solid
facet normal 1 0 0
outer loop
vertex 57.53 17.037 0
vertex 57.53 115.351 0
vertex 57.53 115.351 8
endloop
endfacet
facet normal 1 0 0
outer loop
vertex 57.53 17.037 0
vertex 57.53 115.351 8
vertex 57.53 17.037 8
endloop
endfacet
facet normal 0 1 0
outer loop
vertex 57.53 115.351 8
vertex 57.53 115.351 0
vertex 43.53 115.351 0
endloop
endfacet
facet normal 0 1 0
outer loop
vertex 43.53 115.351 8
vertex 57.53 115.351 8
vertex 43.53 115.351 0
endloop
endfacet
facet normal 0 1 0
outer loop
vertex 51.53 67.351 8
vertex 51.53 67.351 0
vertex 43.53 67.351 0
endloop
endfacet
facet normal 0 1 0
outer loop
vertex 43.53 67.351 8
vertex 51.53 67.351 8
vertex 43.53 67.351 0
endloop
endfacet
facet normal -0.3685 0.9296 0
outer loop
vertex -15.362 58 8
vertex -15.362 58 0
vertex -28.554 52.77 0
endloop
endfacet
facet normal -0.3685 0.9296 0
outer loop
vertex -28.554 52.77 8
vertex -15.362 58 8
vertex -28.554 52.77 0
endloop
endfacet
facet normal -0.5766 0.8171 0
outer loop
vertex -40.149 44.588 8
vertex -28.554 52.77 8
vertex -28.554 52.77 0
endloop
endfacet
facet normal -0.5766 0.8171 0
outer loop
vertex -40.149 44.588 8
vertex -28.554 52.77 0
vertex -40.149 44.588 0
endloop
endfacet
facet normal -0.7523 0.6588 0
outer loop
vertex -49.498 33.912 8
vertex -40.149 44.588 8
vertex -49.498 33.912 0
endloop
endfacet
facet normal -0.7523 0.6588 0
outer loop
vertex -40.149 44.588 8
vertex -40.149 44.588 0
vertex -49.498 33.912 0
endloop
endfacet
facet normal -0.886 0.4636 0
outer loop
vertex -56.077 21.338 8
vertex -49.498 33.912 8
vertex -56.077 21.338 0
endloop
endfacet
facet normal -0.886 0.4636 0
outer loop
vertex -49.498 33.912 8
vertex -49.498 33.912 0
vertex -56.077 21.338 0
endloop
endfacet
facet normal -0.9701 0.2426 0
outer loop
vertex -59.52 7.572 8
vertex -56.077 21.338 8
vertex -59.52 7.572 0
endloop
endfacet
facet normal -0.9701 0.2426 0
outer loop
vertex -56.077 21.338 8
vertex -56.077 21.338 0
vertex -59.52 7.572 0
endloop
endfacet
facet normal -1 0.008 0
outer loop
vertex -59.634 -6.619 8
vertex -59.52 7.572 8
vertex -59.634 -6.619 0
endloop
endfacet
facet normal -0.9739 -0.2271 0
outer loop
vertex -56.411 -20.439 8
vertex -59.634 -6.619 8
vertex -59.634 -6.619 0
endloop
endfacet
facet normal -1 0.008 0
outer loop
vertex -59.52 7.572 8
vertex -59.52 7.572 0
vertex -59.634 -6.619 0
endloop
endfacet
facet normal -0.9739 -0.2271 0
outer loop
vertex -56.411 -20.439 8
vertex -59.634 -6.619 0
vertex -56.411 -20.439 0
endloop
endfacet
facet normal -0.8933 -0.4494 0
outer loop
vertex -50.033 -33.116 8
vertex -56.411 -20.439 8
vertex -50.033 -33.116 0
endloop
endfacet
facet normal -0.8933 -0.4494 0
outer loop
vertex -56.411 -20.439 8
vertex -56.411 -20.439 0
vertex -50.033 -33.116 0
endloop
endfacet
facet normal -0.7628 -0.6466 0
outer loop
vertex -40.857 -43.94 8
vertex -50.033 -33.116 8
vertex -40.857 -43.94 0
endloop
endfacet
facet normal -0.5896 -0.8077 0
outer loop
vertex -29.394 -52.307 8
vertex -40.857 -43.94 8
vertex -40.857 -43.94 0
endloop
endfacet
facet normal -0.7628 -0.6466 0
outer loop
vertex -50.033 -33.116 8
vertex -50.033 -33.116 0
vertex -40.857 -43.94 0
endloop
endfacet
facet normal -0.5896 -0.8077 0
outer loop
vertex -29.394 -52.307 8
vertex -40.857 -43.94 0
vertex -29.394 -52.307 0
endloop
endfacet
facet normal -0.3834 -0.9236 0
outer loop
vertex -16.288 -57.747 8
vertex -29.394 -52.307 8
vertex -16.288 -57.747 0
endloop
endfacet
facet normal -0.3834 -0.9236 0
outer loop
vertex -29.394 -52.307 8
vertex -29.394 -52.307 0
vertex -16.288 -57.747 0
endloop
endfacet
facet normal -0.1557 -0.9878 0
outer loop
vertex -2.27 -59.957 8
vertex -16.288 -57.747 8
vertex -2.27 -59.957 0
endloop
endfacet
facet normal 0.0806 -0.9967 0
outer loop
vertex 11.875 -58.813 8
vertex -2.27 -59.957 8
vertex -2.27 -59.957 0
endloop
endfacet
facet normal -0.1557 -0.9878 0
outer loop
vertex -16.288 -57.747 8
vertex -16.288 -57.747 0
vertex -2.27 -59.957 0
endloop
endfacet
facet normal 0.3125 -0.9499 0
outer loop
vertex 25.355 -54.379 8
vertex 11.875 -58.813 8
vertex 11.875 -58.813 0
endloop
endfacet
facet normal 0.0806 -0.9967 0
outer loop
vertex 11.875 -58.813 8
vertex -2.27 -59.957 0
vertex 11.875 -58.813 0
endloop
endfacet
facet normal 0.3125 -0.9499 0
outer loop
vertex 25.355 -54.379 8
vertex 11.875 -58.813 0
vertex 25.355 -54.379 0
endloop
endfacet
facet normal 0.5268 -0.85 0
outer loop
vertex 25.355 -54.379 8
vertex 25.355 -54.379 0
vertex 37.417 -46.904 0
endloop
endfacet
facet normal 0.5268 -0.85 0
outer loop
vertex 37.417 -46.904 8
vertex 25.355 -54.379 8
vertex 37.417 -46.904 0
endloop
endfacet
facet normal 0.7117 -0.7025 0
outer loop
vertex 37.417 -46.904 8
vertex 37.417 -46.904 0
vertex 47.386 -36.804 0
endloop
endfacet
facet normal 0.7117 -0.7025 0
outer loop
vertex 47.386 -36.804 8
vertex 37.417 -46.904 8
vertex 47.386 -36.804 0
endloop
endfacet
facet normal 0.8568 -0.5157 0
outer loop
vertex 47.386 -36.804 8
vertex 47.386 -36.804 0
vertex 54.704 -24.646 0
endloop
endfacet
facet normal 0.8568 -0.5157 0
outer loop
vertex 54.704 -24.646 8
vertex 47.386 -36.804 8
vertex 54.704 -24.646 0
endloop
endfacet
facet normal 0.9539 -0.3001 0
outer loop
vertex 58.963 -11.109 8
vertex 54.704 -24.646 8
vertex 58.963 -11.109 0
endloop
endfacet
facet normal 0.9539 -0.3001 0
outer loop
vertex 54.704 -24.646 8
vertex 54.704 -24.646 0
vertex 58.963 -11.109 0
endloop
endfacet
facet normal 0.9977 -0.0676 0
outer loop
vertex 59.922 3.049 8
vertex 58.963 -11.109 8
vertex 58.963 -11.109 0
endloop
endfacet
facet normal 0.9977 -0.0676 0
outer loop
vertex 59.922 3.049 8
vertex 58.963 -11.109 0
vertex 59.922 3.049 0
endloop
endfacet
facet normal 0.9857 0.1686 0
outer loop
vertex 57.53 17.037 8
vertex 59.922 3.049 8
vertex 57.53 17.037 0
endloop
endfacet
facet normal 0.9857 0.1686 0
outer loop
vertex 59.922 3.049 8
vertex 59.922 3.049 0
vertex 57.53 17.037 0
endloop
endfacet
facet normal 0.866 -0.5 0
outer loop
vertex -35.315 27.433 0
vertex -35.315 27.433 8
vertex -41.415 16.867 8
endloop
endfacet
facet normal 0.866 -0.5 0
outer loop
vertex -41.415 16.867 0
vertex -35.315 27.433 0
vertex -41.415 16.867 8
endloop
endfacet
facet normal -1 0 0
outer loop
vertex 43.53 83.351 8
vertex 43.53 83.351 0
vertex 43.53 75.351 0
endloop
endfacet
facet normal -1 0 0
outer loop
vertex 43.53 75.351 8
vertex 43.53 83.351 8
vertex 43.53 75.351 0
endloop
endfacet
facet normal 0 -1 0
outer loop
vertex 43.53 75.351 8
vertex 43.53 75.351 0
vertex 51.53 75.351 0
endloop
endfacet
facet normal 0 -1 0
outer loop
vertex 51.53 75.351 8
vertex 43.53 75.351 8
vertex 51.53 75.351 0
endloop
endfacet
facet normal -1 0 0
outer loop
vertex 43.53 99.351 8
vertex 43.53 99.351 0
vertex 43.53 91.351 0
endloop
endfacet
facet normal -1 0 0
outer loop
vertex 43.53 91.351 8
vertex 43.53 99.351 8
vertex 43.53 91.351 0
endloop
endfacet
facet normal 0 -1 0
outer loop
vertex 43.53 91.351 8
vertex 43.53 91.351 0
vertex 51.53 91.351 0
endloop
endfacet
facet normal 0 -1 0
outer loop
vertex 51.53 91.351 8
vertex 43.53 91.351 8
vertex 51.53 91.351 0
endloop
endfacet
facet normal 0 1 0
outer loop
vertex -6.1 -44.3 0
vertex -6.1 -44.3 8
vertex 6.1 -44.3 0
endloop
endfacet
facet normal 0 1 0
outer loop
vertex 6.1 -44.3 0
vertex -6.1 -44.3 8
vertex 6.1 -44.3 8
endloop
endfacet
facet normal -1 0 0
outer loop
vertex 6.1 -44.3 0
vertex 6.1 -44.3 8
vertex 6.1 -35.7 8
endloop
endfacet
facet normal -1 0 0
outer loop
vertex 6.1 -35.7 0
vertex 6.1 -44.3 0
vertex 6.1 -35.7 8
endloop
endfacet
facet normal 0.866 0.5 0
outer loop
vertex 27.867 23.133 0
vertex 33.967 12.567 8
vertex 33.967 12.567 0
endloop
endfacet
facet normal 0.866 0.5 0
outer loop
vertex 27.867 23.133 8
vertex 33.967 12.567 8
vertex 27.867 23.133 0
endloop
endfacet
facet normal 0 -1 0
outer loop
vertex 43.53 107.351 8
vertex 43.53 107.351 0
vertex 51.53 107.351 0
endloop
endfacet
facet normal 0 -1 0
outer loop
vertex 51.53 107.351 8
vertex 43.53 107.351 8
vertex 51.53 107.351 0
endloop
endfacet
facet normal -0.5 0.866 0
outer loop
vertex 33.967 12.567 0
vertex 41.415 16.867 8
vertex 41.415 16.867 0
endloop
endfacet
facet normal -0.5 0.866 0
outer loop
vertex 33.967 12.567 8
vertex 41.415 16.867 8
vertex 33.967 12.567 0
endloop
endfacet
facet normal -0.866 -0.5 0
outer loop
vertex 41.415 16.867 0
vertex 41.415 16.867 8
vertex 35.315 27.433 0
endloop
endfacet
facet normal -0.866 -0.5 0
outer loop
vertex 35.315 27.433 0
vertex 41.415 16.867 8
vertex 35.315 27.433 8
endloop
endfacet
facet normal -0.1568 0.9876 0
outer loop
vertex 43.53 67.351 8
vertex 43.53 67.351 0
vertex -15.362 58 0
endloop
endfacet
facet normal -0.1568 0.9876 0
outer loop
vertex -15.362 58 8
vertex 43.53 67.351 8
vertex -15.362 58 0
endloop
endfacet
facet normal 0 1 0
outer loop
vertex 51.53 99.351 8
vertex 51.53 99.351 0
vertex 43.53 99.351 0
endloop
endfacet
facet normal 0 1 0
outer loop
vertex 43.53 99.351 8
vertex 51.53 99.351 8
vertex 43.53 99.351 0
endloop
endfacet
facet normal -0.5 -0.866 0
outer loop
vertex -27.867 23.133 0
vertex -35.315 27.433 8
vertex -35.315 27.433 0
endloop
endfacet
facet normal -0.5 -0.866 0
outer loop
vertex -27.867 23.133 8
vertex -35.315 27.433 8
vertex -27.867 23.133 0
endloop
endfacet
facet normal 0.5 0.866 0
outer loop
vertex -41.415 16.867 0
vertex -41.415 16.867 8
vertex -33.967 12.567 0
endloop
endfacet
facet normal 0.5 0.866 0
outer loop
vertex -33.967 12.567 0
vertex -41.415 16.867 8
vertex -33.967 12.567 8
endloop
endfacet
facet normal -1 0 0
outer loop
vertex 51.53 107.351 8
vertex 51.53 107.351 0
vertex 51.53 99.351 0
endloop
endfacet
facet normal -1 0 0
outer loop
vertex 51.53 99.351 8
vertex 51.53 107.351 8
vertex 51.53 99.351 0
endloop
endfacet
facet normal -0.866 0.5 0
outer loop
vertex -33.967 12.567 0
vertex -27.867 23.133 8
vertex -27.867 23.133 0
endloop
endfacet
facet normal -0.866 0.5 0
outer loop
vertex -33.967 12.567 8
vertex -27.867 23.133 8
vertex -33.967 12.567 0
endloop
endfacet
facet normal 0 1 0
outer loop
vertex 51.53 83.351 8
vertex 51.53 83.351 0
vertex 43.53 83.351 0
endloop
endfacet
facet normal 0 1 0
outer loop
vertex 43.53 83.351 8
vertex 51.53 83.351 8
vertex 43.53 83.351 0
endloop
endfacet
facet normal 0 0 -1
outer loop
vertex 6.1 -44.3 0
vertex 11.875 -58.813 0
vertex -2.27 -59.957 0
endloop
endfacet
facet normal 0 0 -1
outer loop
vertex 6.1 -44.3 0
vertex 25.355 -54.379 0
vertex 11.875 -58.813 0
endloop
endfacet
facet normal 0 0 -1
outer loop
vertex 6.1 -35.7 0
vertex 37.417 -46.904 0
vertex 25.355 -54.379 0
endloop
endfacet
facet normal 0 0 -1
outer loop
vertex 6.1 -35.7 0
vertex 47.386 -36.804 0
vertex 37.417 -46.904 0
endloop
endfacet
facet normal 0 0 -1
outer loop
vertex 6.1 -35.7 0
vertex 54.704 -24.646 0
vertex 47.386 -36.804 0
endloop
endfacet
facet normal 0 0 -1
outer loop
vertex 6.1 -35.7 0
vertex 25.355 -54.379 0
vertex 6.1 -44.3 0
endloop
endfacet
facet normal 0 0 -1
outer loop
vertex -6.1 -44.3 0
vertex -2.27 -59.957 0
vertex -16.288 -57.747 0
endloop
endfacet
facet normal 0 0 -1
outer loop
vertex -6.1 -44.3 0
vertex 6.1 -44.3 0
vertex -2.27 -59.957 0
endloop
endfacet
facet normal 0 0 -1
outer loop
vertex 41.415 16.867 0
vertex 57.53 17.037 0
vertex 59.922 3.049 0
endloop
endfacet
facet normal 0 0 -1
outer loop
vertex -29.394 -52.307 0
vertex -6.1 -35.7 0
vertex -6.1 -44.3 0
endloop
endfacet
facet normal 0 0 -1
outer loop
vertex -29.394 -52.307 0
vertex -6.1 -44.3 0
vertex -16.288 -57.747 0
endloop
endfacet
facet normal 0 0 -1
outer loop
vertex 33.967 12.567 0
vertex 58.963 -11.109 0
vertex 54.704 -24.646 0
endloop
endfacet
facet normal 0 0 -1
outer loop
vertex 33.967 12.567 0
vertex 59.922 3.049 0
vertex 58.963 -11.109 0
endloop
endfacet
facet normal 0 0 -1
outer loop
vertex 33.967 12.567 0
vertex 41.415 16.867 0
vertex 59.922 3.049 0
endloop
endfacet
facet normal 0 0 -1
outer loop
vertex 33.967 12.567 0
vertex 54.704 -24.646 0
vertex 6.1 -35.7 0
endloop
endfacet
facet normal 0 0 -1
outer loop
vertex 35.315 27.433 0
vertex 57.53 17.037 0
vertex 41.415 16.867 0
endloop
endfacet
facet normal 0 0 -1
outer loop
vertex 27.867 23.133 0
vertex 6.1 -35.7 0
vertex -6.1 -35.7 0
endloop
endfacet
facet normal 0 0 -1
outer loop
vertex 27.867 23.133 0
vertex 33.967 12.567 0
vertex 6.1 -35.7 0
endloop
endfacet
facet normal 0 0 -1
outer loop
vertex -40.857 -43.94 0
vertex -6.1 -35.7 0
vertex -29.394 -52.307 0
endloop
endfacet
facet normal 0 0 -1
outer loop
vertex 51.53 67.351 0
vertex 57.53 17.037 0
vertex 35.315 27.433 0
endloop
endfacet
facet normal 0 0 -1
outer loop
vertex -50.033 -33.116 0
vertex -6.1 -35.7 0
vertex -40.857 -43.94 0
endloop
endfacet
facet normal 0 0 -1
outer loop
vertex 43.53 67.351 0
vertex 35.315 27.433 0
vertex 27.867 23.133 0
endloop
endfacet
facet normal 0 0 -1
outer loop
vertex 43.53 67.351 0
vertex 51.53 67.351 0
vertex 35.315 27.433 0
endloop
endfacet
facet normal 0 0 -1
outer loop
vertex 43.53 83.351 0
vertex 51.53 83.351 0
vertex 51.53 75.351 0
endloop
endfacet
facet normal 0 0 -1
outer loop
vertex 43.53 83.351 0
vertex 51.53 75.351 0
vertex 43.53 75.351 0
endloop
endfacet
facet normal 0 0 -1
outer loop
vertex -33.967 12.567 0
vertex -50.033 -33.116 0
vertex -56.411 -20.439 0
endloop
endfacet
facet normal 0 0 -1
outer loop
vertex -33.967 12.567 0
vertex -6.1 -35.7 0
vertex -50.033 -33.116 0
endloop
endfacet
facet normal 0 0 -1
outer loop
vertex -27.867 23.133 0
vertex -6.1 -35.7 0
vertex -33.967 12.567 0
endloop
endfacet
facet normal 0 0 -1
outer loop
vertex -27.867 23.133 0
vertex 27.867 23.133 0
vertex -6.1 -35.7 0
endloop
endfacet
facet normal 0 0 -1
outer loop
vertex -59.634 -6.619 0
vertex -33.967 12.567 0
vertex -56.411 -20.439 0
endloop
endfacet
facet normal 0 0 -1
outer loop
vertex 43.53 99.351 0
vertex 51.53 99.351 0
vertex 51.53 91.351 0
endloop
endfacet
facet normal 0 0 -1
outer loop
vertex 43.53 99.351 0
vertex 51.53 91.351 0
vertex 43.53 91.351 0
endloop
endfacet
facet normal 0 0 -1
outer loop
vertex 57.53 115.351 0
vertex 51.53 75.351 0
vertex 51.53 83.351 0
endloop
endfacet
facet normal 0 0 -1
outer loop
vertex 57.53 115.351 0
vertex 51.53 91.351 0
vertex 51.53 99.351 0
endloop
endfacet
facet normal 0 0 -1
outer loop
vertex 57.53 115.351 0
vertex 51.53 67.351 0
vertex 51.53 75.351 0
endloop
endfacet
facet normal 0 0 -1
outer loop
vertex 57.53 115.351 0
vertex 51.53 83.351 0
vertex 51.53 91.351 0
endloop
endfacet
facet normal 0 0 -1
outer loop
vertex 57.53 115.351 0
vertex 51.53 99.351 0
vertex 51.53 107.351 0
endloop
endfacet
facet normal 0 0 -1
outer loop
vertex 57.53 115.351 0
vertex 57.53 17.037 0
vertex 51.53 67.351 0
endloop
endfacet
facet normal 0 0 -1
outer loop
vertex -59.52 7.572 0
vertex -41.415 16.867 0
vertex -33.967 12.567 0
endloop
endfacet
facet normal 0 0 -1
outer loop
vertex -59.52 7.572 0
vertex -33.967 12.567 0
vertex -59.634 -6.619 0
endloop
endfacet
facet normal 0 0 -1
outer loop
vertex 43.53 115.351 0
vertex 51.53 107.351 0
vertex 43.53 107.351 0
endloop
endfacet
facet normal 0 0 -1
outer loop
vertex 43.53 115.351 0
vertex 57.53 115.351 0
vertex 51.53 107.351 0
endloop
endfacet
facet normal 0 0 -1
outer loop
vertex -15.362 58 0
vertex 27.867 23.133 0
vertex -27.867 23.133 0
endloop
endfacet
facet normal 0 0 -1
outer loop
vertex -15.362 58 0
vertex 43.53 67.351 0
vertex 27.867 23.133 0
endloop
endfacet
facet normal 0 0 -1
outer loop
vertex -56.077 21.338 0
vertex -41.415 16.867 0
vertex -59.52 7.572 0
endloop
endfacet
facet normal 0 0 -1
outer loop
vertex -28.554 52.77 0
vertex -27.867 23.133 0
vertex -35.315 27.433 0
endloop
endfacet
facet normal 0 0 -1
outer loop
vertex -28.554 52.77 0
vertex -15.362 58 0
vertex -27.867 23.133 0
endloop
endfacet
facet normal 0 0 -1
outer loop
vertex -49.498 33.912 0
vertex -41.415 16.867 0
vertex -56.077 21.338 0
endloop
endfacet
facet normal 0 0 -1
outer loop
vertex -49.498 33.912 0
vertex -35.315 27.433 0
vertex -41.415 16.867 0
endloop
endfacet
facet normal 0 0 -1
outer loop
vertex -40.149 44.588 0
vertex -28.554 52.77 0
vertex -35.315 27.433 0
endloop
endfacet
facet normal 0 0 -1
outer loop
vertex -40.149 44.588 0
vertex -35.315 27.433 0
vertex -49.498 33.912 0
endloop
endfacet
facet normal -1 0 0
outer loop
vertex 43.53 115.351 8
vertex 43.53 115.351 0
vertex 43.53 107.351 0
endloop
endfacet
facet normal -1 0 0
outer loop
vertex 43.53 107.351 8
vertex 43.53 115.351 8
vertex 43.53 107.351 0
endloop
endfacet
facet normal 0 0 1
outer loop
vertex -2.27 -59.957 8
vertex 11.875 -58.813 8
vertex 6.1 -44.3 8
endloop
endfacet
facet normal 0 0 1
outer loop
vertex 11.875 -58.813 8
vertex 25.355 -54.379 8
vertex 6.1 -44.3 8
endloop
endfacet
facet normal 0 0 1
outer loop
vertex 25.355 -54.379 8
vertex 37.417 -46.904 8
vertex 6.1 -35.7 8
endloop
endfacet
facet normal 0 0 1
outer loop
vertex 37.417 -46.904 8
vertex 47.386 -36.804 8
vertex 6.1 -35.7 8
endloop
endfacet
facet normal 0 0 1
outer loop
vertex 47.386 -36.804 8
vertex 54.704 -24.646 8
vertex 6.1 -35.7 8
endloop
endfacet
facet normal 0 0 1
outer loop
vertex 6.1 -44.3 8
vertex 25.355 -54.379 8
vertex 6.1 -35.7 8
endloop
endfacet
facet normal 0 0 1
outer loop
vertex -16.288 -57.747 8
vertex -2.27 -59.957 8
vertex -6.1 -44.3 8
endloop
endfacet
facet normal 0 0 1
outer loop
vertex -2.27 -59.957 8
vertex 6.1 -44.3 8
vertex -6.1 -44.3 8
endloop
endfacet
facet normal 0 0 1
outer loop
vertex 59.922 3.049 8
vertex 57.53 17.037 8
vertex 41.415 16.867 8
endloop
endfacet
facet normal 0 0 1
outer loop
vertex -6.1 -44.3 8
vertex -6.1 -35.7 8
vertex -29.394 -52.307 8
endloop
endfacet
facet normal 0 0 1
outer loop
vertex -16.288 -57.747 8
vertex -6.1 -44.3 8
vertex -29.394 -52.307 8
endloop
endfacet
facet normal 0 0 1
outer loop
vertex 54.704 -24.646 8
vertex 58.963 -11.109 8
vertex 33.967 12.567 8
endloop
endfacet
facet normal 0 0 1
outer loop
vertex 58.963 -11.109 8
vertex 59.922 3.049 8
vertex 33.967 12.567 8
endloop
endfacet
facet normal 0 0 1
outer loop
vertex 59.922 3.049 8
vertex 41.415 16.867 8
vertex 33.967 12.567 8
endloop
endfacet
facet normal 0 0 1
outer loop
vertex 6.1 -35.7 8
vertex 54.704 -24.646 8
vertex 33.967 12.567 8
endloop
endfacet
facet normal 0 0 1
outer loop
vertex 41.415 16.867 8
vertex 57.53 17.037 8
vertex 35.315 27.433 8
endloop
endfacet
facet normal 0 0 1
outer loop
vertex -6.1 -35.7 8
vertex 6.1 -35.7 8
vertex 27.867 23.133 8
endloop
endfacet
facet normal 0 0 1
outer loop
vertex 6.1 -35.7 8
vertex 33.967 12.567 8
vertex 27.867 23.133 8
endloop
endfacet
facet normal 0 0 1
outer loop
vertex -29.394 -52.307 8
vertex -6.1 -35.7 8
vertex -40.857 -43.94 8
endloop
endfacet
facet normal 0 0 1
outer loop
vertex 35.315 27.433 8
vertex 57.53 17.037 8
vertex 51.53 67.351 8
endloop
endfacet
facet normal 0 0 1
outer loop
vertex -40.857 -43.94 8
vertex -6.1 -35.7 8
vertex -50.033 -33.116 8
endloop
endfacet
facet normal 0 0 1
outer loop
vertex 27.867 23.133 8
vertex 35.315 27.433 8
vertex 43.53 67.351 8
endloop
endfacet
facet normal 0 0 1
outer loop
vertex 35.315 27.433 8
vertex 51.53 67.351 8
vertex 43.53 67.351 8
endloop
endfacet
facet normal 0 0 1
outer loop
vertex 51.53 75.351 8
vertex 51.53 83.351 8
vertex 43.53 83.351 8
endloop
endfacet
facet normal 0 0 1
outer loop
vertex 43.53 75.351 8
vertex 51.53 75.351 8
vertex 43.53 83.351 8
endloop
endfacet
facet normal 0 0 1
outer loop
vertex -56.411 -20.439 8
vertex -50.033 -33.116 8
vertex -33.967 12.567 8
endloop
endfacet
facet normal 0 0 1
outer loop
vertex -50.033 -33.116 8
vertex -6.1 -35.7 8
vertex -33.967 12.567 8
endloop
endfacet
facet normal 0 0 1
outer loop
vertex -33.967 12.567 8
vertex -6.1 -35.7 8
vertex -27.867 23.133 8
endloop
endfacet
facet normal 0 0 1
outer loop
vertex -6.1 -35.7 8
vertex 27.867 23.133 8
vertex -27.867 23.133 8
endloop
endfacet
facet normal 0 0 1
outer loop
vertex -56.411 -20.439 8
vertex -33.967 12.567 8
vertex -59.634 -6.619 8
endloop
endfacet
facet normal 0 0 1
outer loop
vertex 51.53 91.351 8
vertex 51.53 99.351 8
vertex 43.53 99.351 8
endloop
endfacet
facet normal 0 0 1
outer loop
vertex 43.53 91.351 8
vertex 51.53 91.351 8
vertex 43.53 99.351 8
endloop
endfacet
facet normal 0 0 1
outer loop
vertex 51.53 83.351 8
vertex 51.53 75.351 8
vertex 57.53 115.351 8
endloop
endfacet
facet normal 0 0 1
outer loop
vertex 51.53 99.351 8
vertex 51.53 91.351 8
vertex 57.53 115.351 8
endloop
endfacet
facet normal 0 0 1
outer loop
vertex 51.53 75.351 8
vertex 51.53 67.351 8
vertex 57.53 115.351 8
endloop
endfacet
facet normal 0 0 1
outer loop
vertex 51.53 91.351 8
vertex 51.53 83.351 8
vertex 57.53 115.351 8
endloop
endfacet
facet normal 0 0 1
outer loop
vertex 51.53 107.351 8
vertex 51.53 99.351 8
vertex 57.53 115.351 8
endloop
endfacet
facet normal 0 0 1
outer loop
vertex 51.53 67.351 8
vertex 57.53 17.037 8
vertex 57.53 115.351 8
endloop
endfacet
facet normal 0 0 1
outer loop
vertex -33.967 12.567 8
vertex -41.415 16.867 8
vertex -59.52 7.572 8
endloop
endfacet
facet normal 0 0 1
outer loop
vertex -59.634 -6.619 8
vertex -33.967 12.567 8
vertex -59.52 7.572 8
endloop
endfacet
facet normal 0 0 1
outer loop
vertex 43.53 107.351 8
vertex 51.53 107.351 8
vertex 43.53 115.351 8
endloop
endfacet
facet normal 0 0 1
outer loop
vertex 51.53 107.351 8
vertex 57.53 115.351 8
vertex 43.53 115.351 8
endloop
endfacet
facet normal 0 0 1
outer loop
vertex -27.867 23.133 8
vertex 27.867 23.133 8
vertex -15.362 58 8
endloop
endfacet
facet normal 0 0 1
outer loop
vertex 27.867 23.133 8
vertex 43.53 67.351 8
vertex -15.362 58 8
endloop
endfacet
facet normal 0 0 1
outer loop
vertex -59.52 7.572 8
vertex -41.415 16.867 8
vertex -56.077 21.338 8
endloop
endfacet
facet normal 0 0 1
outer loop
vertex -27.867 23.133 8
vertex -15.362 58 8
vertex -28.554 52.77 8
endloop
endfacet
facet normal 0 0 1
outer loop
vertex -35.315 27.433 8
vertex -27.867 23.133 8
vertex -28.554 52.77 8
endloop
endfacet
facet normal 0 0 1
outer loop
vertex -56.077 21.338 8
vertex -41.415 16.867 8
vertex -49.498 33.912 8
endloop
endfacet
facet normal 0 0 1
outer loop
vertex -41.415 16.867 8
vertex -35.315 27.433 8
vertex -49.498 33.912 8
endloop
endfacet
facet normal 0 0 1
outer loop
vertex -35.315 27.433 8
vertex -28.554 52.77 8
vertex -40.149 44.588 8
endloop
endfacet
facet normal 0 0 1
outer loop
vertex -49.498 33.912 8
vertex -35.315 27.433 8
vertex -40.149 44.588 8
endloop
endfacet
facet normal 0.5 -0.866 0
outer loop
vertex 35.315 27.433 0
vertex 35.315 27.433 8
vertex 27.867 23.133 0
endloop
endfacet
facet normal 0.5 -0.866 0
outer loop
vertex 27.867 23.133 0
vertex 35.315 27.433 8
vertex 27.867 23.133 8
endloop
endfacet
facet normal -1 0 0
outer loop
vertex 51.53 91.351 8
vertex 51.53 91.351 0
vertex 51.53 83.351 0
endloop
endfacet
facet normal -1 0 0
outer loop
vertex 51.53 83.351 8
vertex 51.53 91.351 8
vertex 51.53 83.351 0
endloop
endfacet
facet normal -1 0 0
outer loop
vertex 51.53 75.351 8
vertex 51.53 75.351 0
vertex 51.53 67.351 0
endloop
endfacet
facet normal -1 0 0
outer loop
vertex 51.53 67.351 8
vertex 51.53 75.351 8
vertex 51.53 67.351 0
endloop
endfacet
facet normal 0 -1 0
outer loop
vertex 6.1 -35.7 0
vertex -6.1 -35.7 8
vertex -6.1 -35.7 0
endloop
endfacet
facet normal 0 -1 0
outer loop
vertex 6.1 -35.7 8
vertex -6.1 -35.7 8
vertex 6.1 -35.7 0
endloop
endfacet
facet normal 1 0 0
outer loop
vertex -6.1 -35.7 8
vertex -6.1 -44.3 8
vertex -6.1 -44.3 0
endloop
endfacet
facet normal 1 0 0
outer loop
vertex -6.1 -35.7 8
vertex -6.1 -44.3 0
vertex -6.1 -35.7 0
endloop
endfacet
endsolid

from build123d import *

# Parameters (mm, degrees)
PAD_DEPTH          = 8
SKETCH001_W        = 12.2
SKETCH001_H        = 8.6
POCKET_DEPTH       = 433.263242
POLARPATTERN_COUNT = 3


with BuildPart() as part:
    # Sketch → Pad (new body)
    with BuildSketch(Plane.XY):
        with BuildLine():
            Line((51.5303, 115.351058), (57.5303, 115.351058))
            Line((57.5303, 115.351058), (57.5303, 17.037153))
            ThreePointArc((-15.362291, 58), (-29.394284, -52.306558), (57.5303, 17.037153))
            Line((43.5303, 67.351058), (-15.362291, 58))
            Line((51.5303, 67.351058), (43.5303, 67.351058))
            Line((51.5303, 75.351058), (51.5303, 67.351058))
            Line((43.5303, 75.351058), (51.5303, 75.351058))
            Line((43.5303, 83.351058), (43.5303, 75.351058))
            Line((51.5303, 83.351058), (43.5303, 83.351058))
            Line((51.5303, 91.351058), (51.5303, 83.351058))
            Line((43.5303, 91.351058), (51.5303, 91.351058))
            Line((43.5303, 99.351058), (43.5303, 91.351058))
            Line((51.5303, 99.351058), (43.5303, 99.351058))
            Line((51.5303, 107.351058), (51.5303, 99.351058))
            Line((43.5303, 107.351058), (51.5303, 107.351058))
            Line((43.5303, 115.351058), (43.5303, 107.351058))
            Line((51.5303, 115.351058), (43.5303, 115.351058))
        make_face()
    extrude(amount=PAD_DEPTH)

    # Sketch001 → Pocket (cut, through all)
    with BuildSketch(Plane.XY.offset(8)):
        with Locations((0, -40)):
            Rectangle(SKETCH001_W, SKETCH001_H)
    pocket = extrude(amount=-POCKET_DEPTH, mode=Mode.SUBTRACT)

    # PolarPattern: Pocket ×3 about axis
    polarpattern_axis = Axis((0, 0, 8), (0, 0, 1))
    for i in range(1, POLARPATTERN_COUNT):
        add(pocket.rotate(polarpattern_axis, i * 360 / POLARPATTERN_COUNT), mode=Mode.SUBTRACT)


solid = part.part
